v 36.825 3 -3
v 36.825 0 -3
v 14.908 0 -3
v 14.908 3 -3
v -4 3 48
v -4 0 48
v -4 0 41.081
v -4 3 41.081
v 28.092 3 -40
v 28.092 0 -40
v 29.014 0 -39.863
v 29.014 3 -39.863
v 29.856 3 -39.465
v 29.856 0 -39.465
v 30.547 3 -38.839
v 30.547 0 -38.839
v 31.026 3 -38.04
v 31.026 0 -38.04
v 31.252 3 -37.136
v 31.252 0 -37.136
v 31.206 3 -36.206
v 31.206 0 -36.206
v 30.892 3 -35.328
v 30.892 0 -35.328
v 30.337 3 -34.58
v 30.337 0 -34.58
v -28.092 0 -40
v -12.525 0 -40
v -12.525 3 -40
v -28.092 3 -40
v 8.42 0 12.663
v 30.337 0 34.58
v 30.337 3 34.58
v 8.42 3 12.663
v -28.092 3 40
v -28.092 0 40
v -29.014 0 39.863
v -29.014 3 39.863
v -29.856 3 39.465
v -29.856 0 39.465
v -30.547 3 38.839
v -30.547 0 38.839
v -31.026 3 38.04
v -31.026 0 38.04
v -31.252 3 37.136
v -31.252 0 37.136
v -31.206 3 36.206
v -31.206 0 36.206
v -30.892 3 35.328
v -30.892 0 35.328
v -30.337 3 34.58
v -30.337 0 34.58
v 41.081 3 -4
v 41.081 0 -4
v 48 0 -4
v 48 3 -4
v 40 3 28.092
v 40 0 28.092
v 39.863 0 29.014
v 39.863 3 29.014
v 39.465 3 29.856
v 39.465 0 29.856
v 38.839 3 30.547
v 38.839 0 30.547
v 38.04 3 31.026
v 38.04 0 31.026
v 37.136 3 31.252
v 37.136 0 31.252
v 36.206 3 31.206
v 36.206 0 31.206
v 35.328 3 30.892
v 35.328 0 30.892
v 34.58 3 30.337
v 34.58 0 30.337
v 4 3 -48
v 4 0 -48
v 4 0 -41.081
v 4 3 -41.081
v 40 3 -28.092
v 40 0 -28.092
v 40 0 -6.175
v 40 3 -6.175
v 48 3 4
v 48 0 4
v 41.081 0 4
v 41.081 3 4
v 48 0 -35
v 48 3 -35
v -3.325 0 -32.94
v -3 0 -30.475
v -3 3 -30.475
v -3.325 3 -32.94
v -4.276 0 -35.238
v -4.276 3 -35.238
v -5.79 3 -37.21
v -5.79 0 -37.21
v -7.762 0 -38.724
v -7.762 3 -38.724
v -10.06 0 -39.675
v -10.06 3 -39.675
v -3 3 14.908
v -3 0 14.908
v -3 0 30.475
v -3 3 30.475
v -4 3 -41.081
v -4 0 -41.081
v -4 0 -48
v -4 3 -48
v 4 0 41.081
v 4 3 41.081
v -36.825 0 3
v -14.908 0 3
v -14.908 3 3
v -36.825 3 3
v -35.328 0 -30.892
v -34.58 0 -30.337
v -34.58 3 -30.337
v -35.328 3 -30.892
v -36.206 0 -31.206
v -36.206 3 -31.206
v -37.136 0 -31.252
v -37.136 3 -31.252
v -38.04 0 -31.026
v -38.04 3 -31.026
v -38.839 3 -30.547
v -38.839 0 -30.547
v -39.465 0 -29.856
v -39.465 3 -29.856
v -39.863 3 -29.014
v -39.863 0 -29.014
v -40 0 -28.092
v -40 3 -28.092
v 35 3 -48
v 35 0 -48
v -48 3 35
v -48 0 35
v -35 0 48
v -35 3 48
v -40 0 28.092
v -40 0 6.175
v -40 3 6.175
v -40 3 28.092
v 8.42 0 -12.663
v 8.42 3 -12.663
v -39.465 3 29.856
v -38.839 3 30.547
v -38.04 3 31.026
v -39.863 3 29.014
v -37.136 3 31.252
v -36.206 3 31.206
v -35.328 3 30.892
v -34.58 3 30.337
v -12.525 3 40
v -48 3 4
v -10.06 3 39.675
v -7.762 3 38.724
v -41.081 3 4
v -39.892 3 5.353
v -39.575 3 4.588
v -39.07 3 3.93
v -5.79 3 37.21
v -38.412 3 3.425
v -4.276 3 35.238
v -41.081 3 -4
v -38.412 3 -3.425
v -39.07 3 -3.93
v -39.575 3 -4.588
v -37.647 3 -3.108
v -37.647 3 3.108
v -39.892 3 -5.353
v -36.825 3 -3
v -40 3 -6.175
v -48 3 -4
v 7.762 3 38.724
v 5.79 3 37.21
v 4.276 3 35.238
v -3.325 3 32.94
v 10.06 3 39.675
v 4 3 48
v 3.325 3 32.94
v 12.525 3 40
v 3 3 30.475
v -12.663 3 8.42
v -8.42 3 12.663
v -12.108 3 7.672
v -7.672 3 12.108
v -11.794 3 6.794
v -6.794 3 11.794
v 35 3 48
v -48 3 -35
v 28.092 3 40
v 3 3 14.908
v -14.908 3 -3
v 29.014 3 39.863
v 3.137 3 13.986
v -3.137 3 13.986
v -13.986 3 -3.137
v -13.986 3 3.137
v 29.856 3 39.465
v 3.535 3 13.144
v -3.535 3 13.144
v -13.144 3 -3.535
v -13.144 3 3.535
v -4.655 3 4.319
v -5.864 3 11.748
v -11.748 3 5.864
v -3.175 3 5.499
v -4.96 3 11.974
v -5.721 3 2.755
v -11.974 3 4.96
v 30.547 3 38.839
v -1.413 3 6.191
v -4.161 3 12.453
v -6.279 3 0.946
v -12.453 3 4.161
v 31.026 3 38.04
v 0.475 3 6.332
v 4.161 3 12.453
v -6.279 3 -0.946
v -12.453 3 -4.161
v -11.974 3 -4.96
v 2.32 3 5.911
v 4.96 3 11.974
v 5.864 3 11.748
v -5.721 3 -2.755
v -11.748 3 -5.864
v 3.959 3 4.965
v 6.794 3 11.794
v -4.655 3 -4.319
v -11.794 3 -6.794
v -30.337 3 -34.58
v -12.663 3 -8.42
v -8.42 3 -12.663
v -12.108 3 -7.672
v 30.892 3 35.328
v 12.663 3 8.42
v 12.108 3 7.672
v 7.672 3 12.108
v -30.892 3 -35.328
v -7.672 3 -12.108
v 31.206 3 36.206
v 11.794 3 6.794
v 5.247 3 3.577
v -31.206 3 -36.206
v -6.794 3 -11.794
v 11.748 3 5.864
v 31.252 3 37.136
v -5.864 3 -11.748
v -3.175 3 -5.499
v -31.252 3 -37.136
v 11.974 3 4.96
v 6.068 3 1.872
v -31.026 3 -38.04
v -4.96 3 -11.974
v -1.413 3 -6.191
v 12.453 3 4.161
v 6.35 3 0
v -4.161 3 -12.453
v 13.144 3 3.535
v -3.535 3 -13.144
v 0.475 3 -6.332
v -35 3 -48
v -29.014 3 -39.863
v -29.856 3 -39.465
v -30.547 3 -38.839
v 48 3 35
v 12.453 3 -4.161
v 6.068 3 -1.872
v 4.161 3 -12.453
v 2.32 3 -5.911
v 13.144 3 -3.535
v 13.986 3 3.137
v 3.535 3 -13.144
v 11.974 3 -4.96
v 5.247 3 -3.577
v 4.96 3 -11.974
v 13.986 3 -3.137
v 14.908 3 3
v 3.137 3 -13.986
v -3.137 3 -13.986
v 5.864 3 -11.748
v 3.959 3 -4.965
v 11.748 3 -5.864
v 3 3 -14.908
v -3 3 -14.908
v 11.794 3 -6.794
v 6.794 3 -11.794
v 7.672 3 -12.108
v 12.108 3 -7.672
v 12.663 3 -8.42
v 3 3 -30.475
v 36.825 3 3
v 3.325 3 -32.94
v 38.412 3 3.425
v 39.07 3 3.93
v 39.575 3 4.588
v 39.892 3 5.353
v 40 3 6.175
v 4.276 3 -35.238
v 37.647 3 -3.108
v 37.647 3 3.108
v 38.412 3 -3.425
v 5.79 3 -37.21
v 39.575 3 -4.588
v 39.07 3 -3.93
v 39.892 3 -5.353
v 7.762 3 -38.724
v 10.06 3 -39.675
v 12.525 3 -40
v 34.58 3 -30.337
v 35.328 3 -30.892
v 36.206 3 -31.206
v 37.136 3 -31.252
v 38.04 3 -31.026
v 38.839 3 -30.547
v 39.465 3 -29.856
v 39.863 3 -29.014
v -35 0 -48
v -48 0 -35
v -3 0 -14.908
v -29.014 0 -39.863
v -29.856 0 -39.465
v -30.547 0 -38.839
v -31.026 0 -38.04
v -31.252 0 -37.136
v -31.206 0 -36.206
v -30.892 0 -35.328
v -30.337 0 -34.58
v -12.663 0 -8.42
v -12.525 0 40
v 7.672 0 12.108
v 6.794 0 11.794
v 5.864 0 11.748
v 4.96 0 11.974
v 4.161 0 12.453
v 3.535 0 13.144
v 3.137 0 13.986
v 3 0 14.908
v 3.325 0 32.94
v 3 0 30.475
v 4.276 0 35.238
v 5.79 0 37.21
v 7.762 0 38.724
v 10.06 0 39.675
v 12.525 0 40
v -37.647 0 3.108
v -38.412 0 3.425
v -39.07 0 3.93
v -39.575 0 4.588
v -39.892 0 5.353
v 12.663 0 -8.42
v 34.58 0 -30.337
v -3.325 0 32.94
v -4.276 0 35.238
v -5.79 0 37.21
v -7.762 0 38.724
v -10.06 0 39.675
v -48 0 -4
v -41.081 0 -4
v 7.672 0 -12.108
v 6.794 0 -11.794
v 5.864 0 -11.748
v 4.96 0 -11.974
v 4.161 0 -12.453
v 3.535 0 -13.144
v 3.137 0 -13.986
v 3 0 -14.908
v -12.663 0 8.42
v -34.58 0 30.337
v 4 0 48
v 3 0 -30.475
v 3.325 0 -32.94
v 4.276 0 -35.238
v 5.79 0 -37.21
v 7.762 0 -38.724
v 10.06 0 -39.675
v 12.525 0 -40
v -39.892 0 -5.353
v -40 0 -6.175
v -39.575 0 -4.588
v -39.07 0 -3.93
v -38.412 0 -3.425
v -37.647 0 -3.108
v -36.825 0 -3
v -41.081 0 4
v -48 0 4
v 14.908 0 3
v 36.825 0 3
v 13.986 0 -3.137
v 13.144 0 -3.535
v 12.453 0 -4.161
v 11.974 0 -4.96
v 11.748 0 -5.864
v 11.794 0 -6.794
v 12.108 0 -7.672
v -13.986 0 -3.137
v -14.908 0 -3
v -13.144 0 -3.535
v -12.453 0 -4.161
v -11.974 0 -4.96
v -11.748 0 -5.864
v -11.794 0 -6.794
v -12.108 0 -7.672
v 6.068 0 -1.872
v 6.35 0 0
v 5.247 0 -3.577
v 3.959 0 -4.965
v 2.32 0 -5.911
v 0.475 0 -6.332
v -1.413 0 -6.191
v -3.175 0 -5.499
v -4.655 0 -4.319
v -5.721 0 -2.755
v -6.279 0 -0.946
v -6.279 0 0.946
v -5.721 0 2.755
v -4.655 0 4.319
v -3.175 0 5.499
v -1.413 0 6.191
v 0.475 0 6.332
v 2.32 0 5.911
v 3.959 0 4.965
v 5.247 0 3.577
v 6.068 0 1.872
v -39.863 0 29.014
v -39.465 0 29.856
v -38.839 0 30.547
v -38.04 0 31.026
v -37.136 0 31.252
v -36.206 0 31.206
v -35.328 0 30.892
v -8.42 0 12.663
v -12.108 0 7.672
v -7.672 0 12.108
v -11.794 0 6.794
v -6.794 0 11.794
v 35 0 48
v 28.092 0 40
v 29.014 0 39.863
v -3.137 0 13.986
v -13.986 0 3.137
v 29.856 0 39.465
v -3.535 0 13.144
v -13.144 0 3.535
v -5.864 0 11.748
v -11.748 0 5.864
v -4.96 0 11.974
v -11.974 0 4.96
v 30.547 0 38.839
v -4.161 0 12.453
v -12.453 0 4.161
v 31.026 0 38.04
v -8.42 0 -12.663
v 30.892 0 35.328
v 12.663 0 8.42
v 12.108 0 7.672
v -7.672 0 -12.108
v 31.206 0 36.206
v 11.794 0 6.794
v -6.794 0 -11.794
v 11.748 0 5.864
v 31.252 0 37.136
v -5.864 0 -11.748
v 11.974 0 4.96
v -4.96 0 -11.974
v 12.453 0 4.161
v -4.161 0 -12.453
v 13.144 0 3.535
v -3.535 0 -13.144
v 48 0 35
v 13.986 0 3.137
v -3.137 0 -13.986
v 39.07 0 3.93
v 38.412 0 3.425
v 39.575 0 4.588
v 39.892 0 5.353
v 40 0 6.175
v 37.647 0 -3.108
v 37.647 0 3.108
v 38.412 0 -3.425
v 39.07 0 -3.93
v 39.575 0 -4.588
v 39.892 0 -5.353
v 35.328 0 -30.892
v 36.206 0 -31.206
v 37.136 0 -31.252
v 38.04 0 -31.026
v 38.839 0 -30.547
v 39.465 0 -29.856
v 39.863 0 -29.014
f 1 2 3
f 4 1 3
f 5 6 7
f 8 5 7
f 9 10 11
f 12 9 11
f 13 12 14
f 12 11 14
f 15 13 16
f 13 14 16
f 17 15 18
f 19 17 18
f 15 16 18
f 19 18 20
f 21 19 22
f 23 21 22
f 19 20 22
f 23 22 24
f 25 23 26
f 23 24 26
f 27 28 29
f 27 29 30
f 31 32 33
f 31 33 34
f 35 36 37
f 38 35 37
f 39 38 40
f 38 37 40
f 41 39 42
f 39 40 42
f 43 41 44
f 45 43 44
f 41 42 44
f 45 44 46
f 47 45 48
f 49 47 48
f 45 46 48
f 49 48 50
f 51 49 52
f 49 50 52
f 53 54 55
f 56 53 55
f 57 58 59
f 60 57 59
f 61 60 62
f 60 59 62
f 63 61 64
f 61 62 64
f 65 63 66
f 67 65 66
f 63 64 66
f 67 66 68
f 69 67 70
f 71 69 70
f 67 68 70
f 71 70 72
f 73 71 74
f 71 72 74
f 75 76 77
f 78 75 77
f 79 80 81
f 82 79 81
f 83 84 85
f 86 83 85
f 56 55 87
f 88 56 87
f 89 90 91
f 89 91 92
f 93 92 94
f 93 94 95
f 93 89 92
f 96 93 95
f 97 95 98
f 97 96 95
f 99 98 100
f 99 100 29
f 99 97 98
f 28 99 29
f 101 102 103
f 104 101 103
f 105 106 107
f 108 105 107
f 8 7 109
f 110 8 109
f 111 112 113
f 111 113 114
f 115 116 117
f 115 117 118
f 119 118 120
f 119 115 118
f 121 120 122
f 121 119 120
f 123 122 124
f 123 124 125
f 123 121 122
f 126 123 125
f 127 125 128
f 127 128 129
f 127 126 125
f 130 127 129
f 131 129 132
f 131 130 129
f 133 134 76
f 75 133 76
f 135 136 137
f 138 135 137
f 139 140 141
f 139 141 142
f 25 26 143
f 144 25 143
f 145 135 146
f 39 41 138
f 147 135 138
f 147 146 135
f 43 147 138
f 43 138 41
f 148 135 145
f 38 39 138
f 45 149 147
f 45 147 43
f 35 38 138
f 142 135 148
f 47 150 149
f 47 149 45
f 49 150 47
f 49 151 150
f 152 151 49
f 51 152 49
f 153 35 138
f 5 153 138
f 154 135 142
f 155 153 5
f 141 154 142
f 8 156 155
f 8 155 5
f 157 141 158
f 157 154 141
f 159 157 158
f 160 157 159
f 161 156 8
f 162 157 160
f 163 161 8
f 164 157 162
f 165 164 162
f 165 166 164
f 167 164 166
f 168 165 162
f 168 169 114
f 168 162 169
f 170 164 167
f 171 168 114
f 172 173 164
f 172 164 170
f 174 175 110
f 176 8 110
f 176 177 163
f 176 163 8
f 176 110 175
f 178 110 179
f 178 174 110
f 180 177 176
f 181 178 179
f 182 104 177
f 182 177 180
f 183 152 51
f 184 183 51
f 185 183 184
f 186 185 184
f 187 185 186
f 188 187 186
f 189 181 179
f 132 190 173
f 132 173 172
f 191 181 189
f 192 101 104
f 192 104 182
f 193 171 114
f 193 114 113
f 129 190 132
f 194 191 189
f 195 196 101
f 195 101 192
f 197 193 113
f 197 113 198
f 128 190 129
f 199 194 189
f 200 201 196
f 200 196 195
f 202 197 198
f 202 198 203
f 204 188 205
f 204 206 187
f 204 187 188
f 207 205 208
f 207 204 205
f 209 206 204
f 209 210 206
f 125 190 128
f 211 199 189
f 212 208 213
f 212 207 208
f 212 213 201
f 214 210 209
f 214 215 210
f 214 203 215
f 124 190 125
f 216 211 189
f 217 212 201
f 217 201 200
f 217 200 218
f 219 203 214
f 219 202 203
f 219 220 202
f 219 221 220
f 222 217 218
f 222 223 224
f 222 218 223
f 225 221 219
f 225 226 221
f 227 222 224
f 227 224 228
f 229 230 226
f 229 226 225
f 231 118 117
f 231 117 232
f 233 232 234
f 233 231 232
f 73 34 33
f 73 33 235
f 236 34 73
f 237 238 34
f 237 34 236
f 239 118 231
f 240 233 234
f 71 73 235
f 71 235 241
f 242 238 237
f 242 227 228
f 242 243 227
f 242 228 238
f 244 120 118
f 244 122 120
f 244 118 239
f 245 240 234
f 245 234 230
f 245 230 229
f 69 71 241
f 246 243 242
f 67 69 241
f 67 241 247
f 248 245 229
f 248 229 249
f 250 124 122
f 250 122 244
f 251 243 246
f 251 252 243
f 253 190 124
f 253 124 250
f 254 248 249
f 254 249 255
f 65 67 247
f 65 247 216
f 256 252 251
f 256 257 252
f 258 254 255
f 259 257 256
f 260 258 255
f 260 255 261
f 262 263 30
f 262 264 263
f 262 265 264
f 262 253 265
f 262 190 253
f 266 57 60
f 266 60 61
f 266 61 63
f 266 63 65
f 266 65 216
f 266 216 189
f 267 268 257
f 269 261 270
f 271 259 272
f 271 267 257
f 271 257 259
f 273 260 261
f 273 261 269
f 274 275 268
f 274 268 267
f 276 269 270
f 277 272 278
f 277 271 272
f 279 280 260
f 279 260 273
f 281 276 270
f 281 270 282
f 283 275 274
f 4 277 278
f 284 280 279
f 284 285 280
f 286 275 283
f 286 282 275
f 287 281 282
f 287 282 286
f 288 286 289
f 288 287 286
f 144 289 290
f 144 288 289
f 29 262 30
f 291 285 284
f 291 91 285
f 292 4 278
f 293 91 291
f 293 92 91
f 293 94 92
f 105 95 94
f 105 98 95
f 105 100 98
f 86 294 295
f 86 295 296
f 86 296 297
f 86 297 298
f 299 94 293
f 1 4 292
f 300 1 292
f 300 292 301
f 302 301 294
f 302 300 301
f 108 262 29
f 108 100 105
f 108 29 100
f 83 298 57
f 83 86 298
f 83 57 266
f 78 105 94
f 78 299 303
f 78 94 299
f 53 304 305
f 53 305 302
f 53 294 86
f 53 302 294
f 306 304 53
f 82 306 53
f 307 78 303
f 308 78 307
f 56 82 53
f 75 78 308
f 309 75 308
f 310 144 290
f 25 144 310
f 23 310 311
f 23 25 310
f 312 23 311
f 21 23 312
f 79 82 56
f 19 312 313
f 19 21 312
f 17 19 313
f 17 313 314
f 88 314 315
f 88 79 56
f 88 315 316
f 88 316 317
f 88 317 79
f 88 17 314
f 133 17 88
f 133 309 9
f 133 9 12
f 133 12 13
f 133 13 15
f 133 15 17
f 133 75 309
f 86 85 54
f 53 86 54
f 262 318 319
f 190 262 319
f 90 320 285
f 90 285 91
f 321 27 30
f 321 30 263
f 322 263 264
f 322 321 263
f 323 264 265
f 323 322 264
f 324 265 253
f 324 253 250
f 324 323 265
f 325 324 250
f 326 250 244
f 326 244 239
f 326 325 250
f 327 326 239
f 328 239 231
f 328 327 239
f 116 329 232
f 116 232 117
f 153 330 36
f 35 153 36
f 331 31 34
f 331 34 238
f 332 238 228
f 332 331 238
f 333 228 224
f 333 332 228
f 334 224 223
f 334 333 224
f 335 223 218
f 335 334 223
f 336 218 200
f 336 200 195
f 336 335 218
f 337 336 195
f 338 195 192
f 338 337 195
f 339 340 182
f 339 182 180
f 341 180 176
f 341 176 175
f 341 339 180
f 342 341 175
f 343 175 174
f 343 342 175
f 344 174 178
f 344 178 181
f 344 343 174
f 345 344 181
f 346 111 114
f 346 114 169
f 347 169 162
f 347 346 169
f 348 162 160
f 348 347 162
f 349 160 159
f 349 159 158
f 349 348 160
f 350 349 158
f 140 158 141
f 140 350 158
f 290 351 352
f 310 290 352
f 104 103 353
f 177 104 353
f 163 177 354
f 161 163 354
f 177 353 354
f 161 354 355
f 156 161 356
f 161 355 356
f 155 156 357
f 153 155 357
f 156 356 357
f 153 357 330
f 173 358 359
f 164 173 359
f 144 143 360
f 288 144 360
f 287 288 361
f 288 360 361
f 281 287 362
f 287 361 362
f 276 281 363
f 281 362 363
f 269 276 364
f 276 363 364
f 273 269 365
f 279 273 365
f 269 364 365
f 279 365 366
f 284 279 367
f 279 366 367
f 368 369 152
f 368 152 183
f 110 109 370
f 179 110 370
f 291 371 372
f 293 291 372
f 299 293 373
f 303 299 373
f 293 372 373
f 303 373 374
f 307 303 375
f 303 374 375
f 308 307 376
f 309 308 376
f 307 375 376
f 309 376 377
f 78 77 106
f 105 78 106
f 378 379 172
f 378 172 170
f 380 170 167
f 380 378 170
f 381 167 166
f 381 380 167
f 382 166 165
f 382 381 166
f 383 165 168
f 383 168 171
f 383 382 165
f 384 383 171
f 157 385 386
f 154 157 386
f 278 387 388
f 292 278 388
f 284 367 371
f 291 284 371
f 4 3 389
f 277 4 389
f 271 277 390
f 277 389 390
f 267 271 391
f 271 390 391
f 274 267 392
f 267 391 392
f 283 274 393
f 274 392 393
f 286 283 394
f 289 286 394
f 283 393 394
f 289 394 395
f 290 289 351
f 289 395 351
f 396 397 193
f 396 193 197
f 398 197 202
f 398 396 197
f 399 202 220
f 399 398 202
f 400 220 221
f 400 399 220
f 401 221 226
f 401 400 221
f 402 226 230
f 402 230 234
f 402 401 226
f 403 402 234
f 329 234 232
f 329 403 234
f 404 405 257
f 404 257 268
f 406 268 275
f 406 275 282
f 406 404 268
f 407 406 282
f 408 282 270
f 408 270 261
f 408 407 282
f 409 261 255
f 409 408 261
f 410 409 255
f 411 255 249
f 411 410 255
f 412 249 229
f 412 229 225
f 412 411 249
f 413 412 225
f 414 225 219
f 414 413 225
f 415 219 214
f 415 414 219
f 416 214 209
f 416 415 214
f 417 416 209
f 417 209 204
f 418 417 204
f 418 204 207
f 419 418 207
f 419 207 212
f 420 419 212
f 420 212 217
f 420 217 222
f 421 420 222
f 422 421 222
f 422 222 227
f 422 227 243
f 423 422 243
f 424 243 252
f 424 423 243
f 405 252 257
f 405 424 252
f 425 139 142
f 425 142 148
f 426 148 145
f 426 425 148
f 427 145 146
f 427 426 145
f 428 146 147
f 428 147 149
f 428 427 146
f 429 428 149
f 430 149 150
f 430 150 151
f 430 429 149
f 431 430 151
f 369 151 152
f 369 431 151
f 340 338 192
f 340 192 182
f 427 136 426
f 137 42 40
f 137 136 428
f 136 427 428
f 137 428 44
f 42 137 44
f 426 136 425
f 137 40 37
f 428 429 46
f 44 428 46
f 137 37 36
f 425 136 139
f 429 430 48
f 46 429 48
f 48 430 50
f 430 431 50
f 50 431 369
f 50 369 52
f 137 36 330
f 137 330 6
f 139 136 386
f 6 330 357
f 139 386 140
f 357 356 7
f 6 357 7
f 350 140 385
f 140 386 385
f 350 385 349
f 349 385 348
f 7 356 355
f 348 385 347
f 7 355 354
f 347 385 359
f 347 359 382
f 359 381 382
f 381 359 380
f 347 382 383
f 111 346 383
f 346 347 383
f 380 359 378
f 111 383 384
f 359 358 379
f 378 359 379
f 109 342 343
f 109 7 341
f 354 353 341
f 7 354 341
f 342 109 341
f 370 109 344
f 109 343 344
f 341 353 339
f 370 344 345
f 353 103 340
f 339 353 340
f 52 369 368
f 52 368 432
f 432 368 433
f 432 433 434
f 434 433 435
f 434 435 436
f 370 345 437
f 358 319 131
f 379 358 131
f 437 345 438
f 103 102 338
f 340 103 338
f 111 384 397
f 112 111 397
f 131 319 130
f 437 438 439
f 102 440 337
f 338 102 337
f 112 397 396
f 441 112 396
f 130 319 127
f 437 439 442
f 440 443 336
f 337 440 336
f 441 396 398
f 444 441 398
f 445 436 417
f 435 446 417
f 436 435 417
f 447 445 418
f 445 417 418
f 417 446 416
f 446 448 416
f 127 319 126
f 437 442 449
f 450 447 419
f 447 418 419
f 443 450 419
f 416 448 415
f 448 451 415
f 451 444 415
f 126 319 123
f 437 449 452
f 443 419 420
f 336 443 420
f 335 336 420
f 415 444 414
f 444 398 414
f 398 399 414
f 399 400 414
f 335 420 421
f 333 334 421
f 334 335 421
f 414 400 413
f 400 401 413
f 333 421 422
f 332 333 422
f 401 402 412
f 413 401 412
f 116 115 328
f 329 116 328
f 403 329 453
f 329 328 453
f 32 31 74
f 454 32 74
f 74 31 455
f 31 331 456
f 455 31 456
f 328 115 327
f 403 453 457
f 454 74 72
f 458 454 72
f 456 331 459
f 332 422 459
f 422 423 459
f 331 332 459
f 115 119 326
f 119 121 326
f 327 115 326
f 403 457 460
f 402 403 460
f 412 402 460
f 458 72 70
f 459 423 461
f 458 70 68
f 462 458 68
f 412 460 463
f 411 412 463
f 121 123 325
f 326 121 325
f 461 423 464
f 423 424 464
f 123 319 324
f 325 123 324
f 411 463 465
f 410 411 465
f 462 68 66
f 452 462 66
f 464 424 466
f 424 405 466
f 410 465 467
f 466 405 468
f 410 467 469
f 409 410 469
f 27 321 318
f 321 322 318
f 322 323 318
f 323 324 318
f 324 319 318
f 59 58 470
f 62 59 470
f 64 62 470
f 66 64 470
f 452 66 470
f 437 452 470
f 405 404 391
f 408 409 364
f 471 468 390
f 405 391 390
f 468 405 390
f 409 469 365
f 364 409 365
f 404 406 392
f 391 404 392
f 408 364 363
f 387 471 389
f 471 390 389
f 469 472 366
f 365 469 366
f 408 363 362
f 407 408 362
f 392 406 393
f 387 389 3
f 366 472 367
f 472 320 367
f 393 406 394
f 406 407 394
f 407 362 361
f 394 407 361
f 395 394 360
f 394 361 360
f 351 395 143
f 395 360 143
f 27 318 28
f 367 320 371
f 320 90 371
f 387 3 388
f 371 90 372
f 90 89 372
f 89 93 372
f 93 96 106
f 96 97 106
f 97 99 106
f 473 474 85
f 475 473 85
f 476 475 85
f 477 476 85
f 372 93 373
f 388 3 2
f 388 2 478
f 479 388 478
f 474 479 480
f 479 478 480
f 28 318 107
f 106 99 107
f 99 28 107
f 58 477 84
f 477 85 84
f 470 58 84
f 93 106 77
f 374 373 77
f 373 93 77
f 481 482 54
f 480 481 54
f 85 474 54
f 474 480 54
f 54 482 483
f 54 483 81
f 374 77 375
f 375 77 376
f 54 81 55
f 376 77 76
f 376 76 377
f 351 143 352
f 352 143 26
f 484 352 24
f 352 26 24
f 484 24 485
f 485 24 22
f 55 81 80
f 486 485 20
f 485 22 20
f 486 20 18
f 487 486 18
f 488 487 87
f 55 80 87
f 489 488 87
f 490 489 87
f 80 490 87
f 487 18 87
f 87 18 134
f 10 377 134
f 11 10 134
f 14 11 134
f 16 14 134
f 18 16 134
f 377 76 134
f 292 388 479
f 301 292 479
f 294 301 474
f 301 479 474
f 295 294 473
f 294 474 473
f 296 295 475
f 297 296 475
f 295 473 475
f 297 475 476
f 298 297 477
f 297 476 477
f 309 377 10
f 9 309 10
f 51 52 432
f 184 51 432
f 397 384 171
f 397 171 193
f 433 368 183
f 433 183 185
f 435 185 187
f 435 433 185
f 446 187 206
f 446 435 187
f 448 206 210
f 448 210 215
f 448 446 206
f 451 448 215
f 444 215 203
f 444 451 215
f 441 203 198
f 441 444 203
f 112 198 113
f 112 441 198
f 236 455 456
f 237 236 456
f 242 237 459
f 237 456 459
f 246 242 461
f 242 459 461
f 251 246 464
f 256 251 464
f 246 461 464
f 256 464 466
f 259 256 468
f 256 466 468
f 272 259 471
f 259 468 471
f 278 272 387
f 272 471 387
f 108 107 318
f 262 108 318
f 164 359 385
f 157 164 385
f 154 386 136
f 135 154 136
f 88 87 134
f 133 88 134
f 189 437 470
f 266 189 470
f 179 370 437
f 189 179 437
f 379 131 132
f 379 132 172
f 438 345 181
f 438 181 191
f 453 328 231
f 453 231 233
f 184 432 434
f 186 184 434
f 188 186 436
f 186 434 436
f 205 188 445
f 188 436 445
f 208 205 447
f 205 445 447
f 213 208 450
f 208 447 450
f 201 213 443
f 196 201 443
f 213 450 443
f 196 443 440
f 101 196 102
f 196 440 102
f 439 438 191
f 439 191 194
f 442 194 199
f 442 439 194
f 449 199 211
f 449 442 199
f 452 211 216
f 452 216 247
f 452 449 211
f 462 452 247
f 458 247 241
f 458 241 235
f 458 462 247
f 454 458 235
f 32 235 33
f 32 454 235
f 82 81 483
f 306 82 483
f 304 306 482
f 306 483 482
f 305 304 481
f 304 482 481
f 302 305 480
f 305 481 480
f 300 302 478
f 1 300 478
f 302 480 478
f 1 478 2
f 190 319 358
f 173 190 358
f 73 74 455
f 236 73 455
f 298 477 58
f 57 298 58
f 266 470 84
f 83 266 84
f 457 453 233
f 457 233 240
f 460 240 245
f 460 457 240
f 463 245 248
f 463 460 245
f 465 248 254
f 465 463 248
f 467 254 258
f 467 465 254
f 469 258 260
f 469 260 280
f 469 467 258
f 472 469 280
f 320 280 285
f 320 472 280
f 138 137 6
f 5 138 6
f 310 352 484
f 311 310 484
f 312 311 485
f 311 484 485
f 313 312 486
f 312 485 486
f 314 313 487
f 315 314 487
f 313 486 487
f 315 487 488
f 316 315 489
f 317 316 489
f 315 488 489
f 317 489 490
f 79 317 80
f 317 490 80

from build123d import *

# Parameters (mm, degrees)
SKETCH1_R           = 6.35
BOSS_EXTRUDE1_DEPTH = 3


with BuildPart() as part:
    # Sketch1 → Boss-Extrude1 (new body)
    with BuildSketch(Plane(origin=(0, 0, 0), x_dir=(1, 0, 0), z_dir=(0, 1, 0))):
        Polygon((48, -4), (41.080632081, -4), (41.080632081, 4), (48, 4), (48, 35), (35, 48), (4, 48), (4, 41.080632081), (-4, 41.080632081), (-4, 48), (-35, 48), (-48, 35), (-48, 4), (-41.08063208, 4), (-41.08063208, -4), (-48, -4), (-48, -35), (-35, -48), (-4, -48), (-4, -41.080632081), (4, -41.080632081), (4, -48), (35, -48), (48, -35), align=None)
        Circle(SKETCH1_R, mode=Mode.SUBTRACT)
        with BuildLine():
            Line((-30.337295283, 34.57993597), (-8.42006403, 12.662704717))
            ThreePointArc((-8.42006403, 12.662704717), (-4.959980102, 11.974451232), (-3, 14.907768748))
            Line((-3, 14.907768748), (-3, 30.475))
            ThreePointArc((-3, 30.475), (-5.789807909, 37.210192091), (-12.525, 40))
            Line((-12.525, 40), (-28.092231252, 40))
            ThreePointArc((-28.092231252, 40), (-31.025548768, 38.040019898), (-30.337295283, 34.57993597))
        make_face(mode=Mode.SUBTRACT)
        with BuildLine():
            Line((3, 14.907768748), (3, 30.475))
            ThreePointArc((3, 30.475), (5.789807909, 37.210192091), (12.525, 40))
            Line((12.525, 40), (28.092231252, 40))
            ThreePointArc((28.092231252, 40), (31.025548768, 38.040019898), (30.337295283, 34.57993597))
            Line((30.337295283, 34.57993597), (8.42006403, 12.662704717))
            ThreePointArc((8.42006403, 12.662704717), (4.959980102, 11.974451232), (3, 14.907768748))
        make_face(mode=Mode.SUBTRACT)
        with BuildLine():
            Line((12.662704717, 8.42006403), (34.57993597, 30.337295283))
            ThreePointArc((34.57993597, 30.337295283), (38.040019898, 31.025548768), (40, 28.092231252))
            Line((40, 28.092231252), (40, 6.175))
            ThreePointArc((40, 6.175), (39.07006403, 3.92993597), (36.825, 3))
            Line((36.825, 3), (14.907768748, 3))
            ThreePointArc((14.907768748, 3), (11.974451232, 4.959980102), (12.662704717, 8.42006403))
        make_face(mode=Mode.SUBTRACT)
        with BuildLine():
            Line((40, -6.175), (40, -28.092231252))
            ThreePointArc((40, -28.092231252), (38.040019898, -31.025548768), (34.57993597, -30.337295283))
            Line((34.57993597, -30.337295283), (12.662704717, -8.42006403))
            ThreePointArc((12.662704717, -8.42006403), (11.974451232, -4.959980102), (14.907768747, -3))
            Line((14.907768747, -3), (36.825, -3))
            ThreePointArc((36.825, -3), (39.07006403, -3.92993597), (40, -6.175))
        make_face(mode=Mode.SUBTRACT)
        with BuildLine():
            Line((30.337295283, -34.57993597), (8.42006403, -12.662704717))
            ThreePointArc((8.42006403, -12.662704717), (4.959980102, -11.974451232), (3, -14.907768748))
            Line((3, -14.907768748), (3, -30.475))
            ThreePointArc((3, -30.475), (5.789807909, -37.210192091), (12.525, -40))
            Line((12.525, -40), (28.092231252, -40))
            ThreePointArc((28.092231252, -40), (31.025548768, -38.040019898), (30.337295283, -34.57993597))
        make_face(mode=Mode.SUBTRACT)
        with BuildLine():
            Line((-3, -14.907768748), (-3, -30.475))
            ThreePointArc((-3, -30.475), (-5.789807909, -37.210192091), (-12.525, -40))
            Line((-12.525, -40), (-28.092231252, -40))
            ThreePointArc((-28.092231252, -40), (-31.025548768, -38.040019898), (-30.337295283, -34.57993597))
            Line((-30.337295283, -34.57993597), (-8.42006403, -12.662704717))
            ThreePointArc((-8.42006403, -12.662704717), (-4.959980102, -11.974451232), (-3, -14.907768748))
        make_face(mode=Mode.SUBTRACT)
        with BuildLine():
            Line((-34.57993597, -30.337295283), (-12.662704717, -8.42006403))
            ThreePointArc((-12.662704717, -8.42006403), (-11.974451232, -4.959980102), (-14.907768747, -3))
            Line((-14.907768747, -3), (-36.825, -3))
            ThreePointArc((-36.825, -3), (-39.07006403, -3.92993597), (-40, -6.175))
            Line((-40, -6.175), (-40, -28.092231252))
            ThreePointArc((-40, -28.092231252), (-38.040019898, -31.025548768), (-34.57993597, -30.337295283))
        make_face(mode=Mode.SUBTRACT)
        with BuildLine():
            Line((-36.825, 3), (-14.907768748, 3))
            ThreePointArc((-14.907768748, 3), (-11.974451232, 4.959980102), (-12.662704717, 8.42006403))
            Line((-12.662704717, 8.42006403), (-34.57993597, 30.337295283))
            ThreePointArc((-34.57993597, 30.337295283), (-38.040019898, 31.025548768), (-40, 28.092231252))
            Line((-40, 28.092231252), (-40, 6.175))
            ThreePointArc((-40, 6.175), (-39.07006403, 3.92993597), (-36.825, 3))
        make_face(mode=Mode.SUBTRACT)
    extrude(amount=BOSS_EXTRUDE1_DEPTH)


solid = part.part
